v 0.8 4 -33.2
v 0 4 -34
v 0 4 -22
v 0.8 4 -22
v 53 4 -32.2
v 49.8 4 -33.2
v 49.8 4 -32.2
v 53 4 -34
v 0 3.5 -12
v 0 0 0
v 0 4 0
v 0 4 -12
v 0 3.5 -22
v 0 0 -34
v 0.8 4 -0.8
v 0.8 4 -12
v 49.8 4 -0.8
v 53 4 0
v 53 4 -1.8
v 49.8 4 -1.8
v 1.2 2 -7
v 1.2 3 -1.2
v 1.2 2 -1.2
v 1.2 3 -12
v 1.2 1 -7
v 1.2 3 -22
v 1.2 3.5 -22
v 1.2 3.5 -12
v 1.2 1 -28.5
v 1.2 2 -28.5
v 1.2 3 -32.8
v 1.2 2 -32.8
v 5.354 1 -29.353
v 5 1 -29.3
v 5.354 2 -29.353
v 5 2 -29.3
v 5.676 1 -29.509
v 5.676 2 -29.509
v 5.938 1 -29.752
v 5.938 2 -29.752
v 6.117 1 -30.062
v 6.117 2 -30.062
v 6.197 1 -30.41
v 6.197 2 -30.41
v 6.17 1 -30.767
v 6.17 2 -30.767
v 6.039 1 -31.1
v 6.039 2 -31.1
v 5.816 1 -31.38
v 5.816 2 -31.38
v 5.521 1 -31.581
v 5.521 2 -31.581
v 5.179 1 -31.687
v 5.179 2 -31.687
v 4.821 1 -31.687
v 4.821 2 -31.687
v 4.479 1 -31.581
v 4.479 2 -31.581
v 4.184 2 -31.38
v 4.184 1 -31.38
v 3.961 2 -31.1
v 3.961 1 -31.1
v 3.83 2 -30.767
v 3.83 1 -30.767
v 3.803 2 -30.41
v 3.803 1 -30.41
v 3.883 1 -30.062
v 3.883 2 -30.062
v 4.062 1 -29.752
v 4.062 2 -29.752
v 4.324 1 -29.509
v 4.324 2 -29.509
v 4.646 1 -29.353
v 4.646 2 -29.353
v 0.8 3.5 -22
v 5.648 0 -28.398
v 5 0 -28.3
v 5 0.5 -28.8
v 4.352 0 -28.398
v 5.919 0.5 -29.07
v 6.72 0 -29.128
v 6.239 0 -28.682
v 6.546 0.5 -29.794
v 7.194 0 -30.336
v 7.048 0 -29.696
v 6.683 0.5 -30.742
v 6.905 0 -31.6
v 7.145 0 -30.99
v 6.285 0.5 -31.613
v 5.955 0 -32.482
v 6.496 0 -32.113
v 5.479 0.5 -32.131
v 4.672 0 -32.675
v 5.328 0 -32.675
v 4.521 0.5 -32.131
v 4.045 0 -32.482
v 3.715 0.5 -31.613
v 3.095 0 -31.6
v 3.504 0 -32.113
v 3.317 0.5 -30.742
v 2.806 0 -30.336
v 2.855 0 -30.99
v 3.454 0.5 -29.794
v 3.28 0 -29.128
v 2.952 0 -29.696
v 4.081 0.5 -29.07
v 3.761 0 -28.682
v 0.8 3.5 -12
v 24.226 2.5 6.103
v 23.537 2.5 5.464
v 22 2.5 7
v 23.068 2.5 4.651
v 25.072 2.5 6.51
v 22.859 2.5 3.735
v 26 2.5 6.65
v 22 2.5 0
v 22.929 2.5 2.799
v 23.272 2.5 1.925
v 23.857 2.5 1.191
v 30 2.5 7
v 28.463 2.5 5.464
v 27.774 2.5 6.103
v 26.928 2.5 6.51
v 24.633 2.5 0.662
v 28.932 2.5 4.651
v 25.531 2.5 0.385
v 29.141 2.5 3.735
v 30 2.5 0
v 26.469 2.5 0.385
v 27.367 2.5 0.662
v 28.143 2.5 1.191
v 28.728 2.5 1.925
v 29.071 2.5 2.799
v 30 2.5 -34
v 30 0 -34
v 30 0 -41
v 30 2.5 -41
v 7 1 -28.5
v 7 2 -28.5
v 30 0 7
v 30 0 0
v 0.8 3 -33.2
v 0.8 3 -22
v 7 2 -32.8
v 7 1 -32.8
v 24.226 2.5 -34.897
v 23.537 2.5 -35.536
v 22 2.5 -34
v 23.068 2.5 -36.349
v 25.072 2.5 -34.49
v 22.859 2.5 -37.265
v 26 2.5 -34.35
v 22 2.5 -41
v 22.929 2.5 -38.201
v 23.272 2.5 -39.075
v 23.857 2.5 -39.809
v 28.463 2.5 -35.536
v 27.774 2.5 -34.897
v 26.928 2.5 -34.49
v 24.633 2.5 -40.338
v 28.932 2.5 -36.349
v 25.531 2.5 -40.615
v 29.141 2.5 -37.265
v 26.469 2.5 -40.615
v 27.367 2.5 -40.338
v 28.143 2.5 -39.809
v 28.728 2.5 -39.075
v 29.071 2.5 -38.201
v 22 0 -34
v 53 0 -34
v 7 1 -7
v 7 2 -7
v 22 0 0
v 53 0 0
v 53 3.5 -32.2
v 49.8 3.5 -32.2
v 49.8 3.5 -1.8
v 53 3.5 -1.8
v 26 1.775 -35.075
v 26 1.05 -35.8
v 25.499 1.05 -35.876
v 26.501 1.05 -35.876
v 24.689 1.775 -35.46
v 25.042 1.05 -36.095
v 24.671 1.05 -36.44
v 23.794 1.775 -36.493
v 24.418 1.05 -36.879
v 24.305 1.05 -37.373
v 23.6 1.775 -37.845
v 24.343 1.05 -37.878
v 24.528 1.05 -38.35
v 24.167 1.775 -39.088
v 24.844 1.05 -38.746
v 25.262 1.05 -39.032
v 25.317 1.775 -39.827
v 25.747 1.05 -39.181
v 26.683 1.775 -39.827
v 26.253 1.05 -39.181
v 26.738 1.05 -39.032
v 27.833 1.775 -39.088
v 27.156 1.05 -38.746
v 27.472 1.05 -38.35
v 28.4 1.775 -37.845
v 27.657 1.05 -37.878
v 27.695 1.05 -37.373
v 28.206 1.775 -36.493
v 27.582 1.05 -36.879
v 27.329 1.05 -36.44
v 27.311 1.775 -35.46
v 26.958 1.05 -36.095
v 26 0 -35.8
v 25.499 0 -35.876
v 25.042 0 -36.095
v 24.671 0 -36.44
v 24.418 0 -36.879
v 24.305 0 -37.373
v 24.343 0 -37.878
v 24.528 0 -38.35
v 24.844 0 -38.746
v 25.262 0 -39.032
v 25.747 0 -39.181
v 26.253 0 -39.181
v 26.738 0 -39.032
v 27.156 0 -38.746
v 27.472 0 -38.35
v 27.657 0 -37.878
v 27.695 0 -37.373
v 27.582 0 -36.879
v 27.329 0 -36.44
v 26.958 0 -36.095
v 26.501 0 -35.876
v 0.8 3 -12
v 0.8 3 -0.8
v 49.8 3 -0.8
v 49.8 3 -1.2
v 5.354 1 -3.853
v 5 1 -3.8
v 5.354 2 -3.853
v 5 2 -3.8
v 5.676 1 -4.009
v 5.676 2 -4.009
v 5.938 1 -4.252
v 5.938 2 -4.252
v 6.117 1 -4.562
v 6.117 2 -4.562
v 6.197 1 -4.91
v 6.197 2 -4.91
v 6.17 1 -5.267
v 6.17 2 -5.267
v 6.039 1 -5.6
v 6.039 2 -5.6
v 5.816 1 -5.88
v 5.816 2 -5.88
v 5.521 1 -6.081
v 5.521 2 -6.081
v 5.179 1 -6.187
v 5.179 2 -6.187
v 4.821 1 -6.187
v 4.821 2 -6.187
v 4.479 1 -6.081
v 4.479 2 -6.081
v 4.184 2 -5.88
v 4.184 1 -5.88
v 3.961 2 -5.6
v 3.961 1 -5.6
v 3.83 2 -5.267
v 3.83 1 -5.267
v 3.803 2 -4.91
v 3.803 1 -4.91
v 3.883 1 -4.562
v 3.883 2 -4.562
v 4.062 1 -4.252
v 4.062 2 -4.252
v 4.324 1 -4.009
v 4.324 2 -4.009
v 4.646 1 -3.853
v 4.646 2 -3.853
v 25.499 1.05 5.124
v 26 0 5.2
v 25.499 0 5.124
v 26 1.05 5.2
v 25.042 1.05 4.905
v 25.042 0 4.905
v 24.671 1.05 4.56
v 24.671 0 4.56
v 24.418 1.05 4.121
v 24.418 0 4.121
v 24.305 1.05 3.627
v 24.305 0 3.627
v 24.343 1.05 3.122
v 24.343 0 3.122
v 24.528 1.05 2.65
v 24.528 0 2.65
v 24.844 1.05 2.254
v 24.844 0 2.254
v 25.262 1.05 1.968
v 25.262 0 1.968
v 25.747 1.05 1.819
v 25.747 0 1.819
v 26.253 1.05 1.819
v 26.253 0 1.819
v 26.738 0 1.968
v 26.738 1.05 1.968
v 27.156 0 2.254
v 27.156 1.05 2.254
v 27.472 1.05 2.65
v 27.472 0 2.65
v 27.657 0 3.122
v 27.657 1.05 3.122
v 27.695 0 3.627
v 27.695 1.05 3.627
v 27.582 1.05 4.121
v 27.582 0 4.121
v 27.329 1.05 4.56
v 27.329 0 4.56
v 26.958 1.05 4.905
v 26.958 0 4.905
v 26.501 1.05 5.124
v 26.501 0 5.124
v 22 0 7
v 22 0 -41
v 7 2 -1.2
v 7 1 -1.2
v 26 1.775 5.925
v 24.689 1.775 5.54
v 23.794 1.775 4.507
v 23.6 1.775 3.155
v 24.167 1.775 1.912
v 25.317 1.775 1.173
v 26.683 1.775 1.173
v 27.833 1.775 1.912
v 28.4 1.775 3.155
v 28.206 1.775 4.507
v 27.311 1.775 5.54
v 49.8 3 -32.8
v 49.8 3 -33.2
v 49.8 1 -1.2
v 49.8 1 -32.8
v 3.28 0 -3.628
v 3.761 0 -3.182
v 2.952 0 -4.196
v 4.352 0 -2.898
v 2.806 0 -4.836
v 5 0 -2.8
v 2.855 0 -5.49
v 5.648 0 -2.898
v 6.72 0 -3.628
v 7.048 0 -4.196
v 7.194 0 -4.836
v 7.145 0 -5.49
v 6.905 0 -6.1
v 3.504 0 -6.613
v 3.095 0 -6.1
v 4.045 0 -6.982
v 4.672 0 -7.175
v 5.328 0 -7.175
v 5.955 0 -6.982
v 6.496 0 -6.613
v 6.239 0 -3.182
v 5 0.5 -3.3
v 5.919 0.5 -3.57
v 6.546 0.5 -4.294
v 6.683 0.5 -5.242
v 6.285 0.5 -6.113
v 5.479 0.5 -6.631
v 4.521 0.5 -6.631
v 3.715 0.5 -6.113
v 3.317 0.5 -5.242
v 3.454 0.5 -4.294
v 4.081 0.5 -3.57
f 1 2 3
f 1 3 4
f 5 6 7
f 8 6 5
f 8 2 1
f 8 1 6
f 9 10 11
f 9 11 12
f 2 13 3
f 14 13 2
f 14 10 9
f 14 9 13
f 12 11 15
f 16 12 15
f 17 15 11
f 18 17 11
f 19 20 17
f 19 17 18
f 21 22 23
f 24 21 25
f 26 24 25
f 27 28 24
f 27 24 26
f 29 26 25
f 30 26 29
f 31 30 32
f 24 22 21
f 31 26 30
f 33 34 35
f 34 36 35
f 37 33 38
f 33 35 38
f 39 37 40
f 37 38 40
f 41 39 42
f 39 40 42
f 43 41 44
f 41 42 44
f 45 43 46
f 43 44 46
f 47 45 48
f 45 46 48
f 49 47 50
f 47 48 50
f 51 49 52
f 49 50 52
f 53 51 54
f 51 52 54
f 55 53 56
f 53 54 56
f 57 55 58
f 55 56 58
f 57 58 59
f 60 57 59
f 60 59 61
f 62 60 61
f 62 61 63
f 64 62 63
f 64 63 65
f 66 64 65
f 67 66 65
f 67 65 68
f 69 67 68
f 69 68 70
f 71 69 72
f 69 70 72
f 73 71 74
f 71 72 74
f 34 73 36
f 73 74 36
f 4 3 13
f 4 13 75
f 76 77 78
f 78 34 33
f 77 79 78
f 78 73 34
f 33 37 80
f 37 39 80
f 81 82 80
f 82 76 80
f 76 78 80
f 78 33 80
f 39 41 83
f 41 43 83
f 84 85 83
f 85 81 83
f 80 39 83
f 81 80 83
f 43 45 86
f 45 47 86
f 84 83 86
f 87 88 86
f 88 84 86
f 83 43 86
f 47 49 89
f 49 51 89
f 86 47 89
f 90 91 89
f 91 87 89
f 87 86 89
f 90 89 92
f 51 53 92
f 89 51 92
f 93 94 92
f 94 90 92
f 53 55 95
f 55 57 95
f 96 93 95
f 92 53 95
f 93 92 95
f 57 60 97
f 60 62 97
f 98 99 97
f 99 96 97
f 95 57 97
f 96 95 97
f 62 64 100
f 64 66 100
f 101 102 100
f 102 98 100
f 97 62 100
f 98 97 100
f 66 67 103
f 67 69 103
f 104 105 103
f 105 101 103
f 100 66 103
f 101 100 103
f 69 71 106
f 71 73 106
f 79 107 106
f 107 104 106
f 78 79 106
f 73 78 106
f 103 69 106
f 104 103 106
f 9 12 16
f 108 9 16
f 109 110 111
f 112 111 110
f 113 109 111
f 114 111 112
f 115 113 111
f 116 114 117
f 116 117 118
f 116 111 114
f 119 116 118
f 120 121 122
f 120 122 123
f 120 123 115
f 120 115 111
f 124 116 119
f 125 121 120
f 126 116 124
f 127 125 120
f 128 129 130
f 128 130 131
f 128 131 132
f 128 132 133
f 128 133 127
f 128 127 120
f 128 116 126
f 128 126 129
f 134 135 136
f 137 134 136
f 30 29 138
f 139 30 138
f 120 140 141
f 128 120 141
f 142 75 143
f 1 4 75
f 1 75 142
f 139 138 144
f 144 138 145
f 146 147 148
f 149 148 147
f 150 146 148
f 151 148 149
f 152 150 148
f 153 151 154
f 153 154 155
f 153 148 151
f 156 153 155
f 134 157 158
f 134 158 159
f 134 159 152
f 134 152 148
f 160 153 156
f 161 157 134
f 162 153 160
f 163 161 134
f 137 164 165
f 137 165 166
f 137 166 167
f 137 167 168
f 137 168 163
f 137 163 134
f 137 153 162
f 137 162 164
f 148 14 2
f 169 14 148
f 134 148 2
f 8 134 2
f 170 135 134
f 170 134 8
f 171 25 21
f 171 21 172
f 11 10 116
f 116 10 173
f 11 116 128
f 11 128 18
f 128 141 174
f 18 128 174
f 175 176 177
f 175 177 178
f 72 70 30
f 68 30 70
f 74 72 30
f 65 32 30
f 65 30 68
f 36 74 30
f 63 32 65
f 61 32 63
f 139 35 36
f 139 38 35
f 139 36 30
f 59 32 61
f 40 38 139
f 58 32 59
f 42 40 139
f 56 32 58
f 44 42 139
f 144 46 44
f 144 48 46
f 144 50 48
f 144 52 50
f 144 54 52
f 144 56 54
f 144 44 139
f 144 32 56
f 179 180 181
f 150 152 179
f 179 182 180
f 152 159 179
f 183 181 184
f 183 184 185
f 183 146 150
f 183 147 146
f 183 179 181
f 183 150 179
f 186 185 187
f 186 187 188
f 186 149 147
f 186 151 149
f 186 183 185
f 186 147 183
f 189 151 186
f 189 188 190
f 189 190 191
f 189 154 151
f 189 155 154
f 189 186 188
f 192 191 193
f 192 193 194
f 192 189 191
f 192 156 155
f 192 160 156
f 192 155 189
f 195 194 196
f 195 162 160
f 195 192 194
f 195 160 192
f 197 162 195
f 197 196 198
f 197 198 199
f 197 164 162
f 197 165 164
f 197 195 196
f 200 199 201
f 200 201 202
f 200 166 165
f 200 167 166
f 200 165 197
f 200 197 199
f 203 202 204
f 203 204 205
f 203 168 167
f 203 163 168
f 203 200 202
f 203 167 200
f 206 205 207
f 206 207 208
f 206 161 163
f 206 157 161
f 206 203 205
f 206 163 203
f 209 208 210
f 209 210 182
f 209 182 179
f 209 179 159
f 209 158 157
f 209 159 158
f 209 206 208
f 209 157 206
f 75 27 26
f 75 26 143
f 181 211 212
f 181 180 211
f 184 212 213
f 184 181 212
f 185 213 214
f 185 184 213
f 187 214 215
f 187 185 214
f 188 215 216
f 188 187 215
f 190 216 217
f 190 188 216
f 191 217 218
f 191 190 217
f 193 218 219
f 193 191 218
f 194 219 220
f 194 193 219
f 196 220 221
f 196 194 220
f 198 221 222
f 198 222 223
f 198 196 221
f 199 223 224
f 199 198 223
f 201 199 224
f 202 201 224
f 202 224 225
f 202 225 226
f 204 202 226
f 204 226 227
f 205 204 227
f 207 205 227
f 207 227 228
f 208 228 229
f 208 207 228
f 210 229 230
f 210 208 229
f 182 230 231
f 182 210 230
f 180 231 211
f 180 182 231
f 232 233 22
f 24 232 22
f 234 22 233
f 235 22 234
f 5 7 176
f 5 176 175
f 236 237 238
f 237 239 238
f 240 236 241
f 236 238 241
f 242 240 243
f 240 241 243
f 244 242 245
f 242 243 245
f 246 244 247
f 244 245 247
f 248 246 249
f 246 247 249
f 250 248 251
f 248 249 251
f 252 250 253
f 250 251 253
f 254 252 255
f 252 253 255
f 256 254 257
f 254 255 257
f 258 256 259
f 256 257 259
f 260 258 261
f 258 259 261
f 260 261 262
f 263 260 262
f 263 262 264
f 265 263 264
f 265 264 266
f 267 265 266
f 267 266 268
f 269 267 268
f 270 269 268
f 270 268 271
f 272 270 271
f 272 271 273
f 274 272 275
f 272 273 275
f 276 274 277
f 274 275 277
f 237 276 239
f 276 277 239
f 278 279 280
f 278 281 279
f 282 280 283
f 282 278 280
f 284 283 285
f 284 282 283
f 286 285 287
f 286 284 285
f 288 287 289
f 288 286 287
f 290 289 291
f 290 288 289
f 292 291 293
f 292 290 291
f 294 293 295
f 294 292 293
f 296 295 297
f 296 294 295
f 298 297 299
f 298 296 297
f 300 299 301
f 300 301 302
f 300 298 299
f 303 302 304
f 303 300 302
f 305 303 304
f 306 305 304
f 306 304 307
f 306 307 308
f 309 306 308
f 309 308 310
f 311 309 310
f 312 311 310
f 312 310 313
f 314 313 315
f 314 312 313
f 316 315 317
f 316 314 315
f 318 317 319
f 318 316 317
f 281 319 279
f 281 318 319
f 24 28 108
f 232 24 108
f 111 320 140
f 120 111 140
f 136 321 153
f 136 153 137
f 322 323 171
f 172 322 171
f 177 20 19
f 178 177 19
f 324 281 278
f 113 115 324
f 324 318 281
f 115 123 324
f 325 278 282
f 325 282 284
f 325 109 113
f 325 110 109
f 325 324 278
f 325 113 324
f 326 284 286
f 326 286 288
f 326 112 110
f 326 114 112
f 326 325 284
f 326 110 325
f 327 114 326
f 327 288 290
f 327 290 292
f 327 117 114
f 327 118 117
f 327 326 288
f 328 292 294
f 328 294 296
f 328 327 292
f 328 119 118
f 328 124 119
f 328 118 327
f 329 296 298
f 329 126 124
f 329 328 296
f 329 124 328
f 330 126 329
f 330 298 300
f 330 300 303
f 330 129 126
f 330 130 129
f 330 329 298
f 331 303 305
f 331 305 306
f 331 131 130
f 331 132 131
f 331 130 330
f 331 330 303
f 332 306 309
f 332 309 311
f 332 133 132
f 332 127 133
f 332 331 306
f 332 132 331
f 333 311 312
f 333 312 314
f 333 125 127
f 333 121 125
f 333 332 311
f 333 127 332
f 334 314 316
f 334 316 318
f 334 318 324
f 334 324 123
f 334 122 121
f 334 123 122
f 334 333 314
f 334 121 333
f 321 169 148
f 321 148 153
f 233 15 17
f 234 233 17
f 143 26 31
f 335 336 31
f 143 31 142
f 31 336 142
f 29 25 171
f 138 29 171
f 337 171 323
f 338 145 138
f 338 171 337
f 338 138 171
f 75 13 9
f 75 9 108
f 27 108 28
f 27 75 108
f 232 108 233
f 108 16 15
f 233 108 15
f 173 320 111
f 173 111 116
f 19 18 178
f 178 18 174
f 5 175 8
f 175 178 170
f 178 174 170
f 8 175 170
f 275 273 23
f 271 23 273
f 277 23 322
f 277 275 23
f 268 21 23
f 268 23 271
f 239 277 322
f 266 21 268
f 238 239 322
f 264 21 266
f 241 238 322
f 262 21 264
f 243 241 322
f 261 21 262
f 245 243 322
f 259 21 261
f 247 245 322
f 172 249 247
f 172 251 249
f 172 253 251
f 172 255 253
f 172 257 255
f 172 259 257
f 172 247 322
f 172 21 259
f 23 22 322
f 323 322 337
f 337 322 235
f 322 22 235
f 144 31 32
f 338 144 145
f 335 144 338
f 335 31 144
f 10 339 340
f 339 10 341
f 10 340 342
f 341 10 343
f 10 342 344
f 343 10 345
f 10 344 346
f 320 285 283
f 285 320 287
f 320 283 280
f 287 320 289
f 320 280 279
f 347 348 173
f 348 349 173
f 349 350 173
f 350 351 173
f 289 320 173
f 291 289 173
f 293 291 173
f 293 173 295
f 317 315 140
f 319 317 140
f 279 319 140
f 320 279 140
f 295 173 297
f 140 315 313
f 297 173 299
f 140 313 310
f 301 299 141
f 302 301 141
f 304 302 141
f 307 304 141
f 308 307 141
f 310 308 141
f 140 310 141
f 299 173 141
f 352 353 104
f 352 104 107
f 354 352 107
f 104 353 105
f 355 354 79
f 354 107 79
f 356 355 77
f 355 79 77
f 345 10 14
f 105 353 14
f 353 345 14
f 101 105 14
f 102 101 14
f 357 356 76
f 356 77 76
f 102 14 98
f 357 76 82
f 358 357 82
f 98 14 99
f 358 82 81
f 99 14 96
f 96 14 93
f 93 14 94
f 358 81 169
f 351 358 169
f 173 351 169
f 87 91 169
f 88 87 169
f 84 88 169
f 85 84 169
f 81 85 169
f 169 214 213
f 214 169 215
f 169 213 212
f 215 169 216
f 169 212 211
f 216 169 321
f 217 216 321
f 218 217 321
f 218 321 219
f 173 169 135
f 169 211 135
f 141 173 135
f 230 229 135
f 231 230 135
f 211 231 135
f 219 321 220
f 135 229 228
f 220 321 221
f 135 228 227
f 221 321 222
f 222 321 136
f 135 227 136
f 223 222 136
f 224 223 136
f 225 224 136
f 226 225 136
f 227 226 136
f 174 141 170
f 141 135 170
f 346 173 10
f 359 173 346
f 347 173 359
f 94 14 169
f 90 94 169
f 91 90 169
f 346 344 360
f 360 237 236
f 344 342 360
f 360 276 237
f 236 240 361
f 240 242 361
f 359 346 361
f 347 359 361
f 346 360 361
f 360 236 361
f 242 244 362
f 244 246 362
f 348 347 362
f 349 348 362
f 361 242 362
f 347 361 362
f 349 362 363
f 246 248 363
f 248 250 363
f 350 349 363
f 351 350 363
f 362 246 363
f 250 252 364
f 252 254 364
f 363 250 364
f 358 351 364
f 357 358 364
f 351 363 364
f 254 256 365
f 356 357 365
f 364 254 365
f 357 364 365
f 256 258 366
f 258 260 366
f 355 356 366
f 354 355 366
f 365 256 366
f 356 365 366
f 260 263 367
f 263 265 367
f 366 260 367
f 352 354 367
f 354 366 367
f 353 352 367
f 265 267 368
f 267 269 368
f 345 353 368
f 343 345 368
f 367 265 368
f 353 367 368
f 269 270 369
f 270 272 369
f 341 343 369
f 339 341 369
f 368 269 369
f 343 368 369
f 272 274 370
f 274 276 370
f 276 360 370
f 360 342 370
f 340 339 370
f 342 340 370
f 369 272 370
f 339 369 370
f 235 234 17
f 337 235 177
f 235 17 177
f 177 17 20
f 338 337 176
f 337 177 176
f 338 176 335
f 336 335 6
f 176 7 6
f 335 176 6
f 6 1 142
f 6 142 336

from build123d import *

# Parameters (mm, degrees)
SKETCH1_W                                           = 53
SKETCH1_H                                           = 34
BOSS_EXTRUDE1_DEPTH                                 = 4
SKETCH2_W                                           = 8
SKETCH2_H                                           = 7
BOSS_EXTRUDE2_DEPTH                                 = 2.5
SKETCH3_W                                           = 48.6
SKETCH3_H                                           = 31.6
CUT_EXTRUDE1_DEPTH                                  = 3
SKETCH4_W                                           = 5.8
SKETCH4_H                                           = 4.3
SKETCH4_H_2                                         = 5.8
BOSS_EXTRUDE3_DEPTH                                 = 1
CUT_EXTRUDE2_DEPTH                                  = 1
SKETCH6_W                                           = 1.2
SKETCH6_H                                           = 10
SKETCH6_W_2                                         = 3.2
SKETCH6_H_2                                         = 30.4
CUT_EXTRUDE3_DEPTH                                  = 0.5
CSK_FOR_M3_COUNTERSUNK_FLAT_HEAD_SCR_2_COUNT        = 2
CSK_FOR_M3_COUNTERSUNK_FLAT_HEAD_SCR_2_PITCH        = 41
CSK_FOR_M2_COUNTERSUNK_FLAT_HEAD_SCREW1_D           = 2.4
CSK_FOR_M2_COUNTERSUNK_FLAT_HEAD_SCREW1_CSINK_D     = 4.4
CSK_FOR_M2_COUNTERSUNK_FLAT_HEAD_SCREW1_CSINK_ANGLE = 90


with BuildPart() as part:
    # Sketch1 → Boss-Extrude1 (new body)
    with BuildSketch(Plane(origin=(0, 0, 0), x_dir=(1, 0, 0), z_dir=(0, 1, 0))):
        with Locations((26.5, 17)):
            Rectangle(SKETCH1_W, SKETCH1_H)
    extrude(amount=BOSS_EXTRUDE1_DEPTH)

    # Sketch2 → Boss-Extrude2 (add)
    with BuildSketch(Plane(origin=(0, 0, 0), x_dir=(1, 0, 0), z_dir=(0, 1, 0))):
        with Locations((26, -3.5)):
            Rectangle(SKETCH2_W, SKETCH2_H)
        with Locations((26, 37.5)):
            Rectangle(SKETCH2_W, SKETCH2_H)
    extrude(amount=BOSS_EXTRUDE2_DEPTH)

    # Sketch3 → Cut-Extrude1 (cut)
    with BuildSketch(Plane(origin=(0, 4, 0), x_dir=(1, 0, 0), z_dir=(0, 1, 0))):
        with Locations((25.5, 17)):
            Rectangle(SKETCH3_W, SKETCH3_H)
    extrude(amount=-CUT_EXTRUDE1_DEPTH, mode=Mode.SUBTRACT)

    # Sketch4 → Boss-Extrude3 (add)
    with BuildSketch(Plane(origin=(0, 1, 0), x_dir=(1, 0, 0), z_dir=(0, 1, 0))):
        with Locations((4.1, 30.65)):
            Rectangle(SKETCH4_W, SKETCH4_H)
        with Locations((4.1, 4.1)):
            Rectangle(SKETCH4_W, SKETCH4_H_2)
    extrude(amount=BOSS_EXTRUDE3_DEPTH)

    # Sketch5 → Cut-Extrude2 (cut)
    with BuildSketch(Plane(origin=(0, 4, 0), x_dir=(1, 0, 0), z_dir=(0, 1, 0))):
        Polygon((49.8, 32.8), (1.2, 32.8), (1.2, 22), (0.8, 22), (0.8, 33.2), (49.8, 33.2), align=None)
        Polygon((49.8, 1.2), (1.2, 1.2), (1.2, 12), (0.8, 12), (0.8, 0.8), (49.8, 0.8), align=None)
    extrude(amount=-CUT_EXTRUDE2_DEPTH, mode=Mode.SUBTRACT)

    # Sketch6 → Cut-Extrude3 (cut)
    with BuildSketch(Plane(origin=(0, 4, 0), x_dir=(1, 0, 0), z_dir=(0, 1, 0))):
        with Locations((0.6, 17)):
            Rectangle(SKETCH6_W, SKETCH6_H)
        with Locations((51.4, 17)):
            Rectangle(SKETCH6_W_2, SKETCH6_H_2)
    extrude(amount=-CUT_EXTRUDE3_DEPTH, mode=Mode.SUBTRACT)

    # Sketch8 → CSK for M3 Countersunk Flat Head Screw1 (revolve, cut)
    with BuildSketch(Plane(origin=(26, 2.5, -37.5), x_dir=(0, 0, 1), z_dir=(1, 0, 0))):
        Polygon((0, 0), (0, 2.5), (1.7, 2.5), (1.7, 1.45), (3.15, 0), align=None)
    csk_for_m3_countersunk_flat_head_screw1 = revolve(axis=Axis((26, 8.85, -37.5), (0, -1, 0)), mode=Mode.SUBTRACT)

    # CSK for M3 Countersunk Flat Head Scr 2: CSK for M3 Countersunk Flat Head Screw1 ×2
    with Locations(*[(0, 0, i * CSK_FOR_M3_COUNTERSUNK_FLAT_HEAD_SCR_2_PITCH) for i in range(1, CSK_FOR_M3_COUNTERSUNK_FLAT_HEAD_SCR_2_COUNT)]):
        add(csk_for_m3_countersunk_flat_head_screw1, mode=Mode.SUBTRACT)

    # CSK for M2 Countersunk Flat Head Screw1 (through all)
    with Locations(Plane(origin=(5, 0, -5), x_dir=(0, 0, -1), z_dir=(0, -1, 0))):
        with Locations((0, 0), (25.5, 0)):
            CounterSinkHole(CSK_FOR_M2_COUNTERSUNK_FLAT_HEAD_SCREW1_D / 2, CSK_FOR_M2_COUNTERSUNK_FLAT_HEAD_SCREW1_CSINK_D / 2, counter_sink_angle=CSK_FOR_M2_COUNTERSUNK_FLAT_HEAD_SCREW1_CSINK_ANGLE)


solid = part.part
